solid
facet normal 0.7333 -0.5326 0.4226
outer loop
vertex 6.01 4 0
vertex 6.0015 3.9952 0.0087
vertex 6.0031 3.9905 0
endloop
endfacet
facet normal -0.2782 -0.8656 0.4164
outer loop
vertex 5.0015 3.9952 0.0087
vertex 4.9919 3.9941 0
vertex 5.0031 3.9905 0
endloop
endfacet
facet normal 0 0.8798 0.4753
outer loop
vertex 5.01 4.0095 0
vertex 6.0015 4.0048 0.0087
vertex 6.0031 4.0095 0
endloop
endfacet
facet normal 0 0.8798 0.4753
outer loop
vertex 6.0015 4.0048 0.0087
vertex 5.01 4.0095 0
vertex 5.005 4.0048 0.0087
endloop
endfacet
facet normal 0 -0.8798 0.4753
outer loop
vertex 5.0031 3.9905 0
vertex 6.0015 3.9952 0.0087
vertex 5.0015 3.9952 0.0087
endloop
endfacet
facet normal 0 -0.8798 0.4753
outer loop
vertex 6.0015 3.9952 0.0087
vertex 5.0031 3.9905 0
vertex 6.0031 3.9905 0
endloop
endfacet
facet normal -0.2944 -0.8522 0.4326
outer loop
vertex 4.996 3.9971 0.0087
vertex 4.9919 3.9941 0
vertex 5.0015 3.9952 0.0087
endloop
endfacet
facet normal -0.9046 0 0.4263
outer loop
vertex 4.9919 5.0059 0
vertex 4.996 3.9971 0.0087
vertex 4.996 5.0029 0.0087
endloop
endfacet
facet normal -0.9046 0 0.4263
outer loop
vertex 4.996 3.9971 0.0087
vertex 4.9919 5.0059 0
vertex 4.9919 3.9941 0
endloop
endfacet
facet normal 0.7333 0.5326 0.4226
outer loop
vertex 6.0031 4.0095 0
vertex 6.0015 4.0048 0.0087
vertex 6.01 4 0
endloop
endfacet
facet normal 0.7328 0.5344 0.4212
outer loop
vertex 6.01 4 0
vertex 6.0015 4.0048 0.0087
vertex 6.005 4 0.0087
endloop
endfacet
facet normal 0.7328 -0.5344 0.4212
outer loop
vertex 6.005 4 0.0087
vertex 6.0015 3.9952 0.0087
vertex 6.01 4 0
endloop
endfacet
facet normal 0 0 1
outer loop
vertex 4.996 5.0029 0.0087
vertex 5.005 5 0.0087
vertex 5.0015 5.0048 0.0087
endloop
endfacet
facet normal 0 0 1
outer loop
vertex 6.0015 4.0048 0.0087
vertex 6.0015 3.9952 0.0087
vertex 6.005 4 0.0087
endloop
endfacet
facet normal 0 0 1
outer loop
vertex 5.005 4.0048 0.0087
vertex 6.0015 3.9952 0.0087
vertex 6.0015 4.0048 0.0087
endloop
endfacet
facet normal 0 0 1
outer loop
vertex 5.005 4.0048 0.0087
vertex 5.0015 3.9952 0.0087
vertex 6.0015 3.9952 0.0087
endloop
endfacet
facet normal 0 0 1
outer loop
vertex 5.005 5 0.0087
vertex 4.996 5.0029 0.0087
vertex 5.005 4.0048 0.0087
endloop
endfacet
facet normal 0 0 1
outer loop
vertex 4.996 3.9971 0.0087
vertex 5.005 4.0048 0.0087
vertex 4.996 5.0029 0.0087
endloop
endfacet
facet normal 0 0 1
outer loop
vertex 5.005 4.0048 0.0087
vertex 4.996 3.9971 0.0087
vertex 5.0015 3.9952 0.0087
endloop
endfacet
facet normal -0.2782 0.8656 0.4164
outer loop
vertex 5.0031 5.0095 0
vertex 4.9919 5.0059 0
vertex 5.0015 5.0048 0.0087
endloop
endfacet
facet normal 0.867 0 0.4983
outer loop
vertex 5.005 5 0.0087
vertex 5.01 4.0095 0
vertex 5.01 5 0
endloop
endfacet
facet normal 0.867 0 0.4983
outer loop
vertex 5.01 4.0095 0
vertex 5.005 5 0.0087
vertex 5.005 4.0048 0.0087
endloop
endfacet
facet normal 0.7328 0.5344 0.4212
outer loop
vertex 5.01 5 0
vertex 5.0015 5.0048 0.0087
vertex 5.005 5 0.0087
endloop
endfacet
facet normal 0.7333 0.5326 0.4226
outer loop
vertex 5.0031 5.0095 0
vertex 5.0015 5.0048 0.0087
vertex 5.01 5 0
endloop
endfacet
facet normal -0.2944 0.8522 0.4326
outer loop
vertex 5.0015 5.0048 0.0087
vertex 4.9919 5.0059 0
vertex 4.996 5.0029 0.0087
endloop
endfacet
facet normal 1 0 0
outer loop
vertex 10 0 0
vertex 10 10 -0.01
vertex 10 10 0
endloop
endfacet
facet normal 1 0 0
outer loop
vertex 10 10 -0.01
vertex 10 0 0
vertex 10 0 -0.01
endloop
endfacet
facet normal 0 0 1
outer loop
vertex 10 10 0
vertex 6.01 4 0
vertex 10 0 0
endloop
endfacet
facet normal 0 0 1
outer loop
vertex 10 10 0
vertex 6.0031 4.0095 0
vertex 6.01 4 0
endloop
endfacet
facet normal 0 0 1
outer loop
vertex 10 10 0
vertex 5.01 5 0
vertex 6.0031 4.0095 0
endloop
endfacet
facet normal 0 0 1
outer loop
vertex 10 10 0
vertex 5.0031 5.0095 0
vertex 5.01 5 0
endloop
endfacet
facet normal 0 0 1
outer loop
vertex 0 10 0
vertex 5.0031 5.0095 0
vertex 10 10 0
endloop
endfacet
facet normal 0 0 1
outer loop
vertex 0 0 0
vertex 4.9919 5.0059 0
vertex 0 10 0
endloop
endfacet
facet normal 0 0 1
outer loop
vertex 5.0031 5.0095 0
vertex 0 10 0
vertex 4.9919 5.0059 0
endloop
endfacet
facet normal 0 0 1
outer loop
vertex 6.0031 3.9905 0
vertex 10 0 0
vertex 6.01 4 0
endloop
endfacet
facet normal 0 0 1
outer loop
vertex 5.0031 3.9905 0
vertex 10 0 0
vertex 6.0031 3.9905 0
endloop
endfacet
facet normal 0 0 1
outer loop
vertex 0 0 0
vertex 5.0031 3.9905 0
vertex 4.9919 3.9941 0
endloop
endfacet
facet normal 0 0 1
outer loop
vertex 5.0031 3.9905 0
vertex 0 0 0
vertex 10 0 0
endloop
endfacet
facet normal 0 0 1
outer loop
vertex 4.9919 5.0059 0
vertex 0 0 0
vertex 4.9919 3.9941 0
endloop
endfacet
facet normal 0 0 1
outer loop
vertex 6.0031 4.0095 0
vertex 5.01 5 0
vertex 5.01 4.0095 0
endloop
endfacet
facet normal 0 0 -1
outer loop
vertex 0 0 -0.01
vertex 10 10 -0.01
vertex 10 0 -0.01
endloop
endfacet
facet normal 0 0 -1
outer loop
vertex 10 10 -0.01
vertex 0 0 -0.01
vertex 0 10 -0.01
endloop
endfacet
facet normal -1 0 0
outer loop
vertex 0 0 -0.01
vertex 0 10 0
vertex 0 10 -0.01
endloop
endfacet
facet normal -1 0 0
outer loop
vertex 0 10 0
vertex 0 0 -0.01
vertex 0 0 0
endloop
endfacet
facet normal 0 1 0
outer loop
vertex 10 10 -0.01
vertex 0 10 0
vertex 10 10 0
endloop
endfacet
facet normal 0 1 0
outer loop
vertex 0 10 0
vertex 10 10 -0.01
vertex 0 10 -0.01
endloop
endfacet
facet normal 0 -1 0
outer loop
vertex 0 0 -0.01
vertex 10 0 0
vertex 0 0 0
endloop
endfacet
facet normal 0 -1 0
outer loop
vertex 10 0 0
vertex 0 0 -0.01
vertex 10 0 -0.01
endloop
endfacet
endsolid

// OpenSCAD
hull(){
    translate([6, 4]) sphere(0.01);
    translate([5, 4]) sphere(0.01);
}
hull(){
    translate([5, 4]) sphere(0.01);
    translate([5, 5]) sphere(0.01);
}
translate([0,0,-0.01]) color([0.1,0.1,0.1]) cube([10,10,0.01]);
